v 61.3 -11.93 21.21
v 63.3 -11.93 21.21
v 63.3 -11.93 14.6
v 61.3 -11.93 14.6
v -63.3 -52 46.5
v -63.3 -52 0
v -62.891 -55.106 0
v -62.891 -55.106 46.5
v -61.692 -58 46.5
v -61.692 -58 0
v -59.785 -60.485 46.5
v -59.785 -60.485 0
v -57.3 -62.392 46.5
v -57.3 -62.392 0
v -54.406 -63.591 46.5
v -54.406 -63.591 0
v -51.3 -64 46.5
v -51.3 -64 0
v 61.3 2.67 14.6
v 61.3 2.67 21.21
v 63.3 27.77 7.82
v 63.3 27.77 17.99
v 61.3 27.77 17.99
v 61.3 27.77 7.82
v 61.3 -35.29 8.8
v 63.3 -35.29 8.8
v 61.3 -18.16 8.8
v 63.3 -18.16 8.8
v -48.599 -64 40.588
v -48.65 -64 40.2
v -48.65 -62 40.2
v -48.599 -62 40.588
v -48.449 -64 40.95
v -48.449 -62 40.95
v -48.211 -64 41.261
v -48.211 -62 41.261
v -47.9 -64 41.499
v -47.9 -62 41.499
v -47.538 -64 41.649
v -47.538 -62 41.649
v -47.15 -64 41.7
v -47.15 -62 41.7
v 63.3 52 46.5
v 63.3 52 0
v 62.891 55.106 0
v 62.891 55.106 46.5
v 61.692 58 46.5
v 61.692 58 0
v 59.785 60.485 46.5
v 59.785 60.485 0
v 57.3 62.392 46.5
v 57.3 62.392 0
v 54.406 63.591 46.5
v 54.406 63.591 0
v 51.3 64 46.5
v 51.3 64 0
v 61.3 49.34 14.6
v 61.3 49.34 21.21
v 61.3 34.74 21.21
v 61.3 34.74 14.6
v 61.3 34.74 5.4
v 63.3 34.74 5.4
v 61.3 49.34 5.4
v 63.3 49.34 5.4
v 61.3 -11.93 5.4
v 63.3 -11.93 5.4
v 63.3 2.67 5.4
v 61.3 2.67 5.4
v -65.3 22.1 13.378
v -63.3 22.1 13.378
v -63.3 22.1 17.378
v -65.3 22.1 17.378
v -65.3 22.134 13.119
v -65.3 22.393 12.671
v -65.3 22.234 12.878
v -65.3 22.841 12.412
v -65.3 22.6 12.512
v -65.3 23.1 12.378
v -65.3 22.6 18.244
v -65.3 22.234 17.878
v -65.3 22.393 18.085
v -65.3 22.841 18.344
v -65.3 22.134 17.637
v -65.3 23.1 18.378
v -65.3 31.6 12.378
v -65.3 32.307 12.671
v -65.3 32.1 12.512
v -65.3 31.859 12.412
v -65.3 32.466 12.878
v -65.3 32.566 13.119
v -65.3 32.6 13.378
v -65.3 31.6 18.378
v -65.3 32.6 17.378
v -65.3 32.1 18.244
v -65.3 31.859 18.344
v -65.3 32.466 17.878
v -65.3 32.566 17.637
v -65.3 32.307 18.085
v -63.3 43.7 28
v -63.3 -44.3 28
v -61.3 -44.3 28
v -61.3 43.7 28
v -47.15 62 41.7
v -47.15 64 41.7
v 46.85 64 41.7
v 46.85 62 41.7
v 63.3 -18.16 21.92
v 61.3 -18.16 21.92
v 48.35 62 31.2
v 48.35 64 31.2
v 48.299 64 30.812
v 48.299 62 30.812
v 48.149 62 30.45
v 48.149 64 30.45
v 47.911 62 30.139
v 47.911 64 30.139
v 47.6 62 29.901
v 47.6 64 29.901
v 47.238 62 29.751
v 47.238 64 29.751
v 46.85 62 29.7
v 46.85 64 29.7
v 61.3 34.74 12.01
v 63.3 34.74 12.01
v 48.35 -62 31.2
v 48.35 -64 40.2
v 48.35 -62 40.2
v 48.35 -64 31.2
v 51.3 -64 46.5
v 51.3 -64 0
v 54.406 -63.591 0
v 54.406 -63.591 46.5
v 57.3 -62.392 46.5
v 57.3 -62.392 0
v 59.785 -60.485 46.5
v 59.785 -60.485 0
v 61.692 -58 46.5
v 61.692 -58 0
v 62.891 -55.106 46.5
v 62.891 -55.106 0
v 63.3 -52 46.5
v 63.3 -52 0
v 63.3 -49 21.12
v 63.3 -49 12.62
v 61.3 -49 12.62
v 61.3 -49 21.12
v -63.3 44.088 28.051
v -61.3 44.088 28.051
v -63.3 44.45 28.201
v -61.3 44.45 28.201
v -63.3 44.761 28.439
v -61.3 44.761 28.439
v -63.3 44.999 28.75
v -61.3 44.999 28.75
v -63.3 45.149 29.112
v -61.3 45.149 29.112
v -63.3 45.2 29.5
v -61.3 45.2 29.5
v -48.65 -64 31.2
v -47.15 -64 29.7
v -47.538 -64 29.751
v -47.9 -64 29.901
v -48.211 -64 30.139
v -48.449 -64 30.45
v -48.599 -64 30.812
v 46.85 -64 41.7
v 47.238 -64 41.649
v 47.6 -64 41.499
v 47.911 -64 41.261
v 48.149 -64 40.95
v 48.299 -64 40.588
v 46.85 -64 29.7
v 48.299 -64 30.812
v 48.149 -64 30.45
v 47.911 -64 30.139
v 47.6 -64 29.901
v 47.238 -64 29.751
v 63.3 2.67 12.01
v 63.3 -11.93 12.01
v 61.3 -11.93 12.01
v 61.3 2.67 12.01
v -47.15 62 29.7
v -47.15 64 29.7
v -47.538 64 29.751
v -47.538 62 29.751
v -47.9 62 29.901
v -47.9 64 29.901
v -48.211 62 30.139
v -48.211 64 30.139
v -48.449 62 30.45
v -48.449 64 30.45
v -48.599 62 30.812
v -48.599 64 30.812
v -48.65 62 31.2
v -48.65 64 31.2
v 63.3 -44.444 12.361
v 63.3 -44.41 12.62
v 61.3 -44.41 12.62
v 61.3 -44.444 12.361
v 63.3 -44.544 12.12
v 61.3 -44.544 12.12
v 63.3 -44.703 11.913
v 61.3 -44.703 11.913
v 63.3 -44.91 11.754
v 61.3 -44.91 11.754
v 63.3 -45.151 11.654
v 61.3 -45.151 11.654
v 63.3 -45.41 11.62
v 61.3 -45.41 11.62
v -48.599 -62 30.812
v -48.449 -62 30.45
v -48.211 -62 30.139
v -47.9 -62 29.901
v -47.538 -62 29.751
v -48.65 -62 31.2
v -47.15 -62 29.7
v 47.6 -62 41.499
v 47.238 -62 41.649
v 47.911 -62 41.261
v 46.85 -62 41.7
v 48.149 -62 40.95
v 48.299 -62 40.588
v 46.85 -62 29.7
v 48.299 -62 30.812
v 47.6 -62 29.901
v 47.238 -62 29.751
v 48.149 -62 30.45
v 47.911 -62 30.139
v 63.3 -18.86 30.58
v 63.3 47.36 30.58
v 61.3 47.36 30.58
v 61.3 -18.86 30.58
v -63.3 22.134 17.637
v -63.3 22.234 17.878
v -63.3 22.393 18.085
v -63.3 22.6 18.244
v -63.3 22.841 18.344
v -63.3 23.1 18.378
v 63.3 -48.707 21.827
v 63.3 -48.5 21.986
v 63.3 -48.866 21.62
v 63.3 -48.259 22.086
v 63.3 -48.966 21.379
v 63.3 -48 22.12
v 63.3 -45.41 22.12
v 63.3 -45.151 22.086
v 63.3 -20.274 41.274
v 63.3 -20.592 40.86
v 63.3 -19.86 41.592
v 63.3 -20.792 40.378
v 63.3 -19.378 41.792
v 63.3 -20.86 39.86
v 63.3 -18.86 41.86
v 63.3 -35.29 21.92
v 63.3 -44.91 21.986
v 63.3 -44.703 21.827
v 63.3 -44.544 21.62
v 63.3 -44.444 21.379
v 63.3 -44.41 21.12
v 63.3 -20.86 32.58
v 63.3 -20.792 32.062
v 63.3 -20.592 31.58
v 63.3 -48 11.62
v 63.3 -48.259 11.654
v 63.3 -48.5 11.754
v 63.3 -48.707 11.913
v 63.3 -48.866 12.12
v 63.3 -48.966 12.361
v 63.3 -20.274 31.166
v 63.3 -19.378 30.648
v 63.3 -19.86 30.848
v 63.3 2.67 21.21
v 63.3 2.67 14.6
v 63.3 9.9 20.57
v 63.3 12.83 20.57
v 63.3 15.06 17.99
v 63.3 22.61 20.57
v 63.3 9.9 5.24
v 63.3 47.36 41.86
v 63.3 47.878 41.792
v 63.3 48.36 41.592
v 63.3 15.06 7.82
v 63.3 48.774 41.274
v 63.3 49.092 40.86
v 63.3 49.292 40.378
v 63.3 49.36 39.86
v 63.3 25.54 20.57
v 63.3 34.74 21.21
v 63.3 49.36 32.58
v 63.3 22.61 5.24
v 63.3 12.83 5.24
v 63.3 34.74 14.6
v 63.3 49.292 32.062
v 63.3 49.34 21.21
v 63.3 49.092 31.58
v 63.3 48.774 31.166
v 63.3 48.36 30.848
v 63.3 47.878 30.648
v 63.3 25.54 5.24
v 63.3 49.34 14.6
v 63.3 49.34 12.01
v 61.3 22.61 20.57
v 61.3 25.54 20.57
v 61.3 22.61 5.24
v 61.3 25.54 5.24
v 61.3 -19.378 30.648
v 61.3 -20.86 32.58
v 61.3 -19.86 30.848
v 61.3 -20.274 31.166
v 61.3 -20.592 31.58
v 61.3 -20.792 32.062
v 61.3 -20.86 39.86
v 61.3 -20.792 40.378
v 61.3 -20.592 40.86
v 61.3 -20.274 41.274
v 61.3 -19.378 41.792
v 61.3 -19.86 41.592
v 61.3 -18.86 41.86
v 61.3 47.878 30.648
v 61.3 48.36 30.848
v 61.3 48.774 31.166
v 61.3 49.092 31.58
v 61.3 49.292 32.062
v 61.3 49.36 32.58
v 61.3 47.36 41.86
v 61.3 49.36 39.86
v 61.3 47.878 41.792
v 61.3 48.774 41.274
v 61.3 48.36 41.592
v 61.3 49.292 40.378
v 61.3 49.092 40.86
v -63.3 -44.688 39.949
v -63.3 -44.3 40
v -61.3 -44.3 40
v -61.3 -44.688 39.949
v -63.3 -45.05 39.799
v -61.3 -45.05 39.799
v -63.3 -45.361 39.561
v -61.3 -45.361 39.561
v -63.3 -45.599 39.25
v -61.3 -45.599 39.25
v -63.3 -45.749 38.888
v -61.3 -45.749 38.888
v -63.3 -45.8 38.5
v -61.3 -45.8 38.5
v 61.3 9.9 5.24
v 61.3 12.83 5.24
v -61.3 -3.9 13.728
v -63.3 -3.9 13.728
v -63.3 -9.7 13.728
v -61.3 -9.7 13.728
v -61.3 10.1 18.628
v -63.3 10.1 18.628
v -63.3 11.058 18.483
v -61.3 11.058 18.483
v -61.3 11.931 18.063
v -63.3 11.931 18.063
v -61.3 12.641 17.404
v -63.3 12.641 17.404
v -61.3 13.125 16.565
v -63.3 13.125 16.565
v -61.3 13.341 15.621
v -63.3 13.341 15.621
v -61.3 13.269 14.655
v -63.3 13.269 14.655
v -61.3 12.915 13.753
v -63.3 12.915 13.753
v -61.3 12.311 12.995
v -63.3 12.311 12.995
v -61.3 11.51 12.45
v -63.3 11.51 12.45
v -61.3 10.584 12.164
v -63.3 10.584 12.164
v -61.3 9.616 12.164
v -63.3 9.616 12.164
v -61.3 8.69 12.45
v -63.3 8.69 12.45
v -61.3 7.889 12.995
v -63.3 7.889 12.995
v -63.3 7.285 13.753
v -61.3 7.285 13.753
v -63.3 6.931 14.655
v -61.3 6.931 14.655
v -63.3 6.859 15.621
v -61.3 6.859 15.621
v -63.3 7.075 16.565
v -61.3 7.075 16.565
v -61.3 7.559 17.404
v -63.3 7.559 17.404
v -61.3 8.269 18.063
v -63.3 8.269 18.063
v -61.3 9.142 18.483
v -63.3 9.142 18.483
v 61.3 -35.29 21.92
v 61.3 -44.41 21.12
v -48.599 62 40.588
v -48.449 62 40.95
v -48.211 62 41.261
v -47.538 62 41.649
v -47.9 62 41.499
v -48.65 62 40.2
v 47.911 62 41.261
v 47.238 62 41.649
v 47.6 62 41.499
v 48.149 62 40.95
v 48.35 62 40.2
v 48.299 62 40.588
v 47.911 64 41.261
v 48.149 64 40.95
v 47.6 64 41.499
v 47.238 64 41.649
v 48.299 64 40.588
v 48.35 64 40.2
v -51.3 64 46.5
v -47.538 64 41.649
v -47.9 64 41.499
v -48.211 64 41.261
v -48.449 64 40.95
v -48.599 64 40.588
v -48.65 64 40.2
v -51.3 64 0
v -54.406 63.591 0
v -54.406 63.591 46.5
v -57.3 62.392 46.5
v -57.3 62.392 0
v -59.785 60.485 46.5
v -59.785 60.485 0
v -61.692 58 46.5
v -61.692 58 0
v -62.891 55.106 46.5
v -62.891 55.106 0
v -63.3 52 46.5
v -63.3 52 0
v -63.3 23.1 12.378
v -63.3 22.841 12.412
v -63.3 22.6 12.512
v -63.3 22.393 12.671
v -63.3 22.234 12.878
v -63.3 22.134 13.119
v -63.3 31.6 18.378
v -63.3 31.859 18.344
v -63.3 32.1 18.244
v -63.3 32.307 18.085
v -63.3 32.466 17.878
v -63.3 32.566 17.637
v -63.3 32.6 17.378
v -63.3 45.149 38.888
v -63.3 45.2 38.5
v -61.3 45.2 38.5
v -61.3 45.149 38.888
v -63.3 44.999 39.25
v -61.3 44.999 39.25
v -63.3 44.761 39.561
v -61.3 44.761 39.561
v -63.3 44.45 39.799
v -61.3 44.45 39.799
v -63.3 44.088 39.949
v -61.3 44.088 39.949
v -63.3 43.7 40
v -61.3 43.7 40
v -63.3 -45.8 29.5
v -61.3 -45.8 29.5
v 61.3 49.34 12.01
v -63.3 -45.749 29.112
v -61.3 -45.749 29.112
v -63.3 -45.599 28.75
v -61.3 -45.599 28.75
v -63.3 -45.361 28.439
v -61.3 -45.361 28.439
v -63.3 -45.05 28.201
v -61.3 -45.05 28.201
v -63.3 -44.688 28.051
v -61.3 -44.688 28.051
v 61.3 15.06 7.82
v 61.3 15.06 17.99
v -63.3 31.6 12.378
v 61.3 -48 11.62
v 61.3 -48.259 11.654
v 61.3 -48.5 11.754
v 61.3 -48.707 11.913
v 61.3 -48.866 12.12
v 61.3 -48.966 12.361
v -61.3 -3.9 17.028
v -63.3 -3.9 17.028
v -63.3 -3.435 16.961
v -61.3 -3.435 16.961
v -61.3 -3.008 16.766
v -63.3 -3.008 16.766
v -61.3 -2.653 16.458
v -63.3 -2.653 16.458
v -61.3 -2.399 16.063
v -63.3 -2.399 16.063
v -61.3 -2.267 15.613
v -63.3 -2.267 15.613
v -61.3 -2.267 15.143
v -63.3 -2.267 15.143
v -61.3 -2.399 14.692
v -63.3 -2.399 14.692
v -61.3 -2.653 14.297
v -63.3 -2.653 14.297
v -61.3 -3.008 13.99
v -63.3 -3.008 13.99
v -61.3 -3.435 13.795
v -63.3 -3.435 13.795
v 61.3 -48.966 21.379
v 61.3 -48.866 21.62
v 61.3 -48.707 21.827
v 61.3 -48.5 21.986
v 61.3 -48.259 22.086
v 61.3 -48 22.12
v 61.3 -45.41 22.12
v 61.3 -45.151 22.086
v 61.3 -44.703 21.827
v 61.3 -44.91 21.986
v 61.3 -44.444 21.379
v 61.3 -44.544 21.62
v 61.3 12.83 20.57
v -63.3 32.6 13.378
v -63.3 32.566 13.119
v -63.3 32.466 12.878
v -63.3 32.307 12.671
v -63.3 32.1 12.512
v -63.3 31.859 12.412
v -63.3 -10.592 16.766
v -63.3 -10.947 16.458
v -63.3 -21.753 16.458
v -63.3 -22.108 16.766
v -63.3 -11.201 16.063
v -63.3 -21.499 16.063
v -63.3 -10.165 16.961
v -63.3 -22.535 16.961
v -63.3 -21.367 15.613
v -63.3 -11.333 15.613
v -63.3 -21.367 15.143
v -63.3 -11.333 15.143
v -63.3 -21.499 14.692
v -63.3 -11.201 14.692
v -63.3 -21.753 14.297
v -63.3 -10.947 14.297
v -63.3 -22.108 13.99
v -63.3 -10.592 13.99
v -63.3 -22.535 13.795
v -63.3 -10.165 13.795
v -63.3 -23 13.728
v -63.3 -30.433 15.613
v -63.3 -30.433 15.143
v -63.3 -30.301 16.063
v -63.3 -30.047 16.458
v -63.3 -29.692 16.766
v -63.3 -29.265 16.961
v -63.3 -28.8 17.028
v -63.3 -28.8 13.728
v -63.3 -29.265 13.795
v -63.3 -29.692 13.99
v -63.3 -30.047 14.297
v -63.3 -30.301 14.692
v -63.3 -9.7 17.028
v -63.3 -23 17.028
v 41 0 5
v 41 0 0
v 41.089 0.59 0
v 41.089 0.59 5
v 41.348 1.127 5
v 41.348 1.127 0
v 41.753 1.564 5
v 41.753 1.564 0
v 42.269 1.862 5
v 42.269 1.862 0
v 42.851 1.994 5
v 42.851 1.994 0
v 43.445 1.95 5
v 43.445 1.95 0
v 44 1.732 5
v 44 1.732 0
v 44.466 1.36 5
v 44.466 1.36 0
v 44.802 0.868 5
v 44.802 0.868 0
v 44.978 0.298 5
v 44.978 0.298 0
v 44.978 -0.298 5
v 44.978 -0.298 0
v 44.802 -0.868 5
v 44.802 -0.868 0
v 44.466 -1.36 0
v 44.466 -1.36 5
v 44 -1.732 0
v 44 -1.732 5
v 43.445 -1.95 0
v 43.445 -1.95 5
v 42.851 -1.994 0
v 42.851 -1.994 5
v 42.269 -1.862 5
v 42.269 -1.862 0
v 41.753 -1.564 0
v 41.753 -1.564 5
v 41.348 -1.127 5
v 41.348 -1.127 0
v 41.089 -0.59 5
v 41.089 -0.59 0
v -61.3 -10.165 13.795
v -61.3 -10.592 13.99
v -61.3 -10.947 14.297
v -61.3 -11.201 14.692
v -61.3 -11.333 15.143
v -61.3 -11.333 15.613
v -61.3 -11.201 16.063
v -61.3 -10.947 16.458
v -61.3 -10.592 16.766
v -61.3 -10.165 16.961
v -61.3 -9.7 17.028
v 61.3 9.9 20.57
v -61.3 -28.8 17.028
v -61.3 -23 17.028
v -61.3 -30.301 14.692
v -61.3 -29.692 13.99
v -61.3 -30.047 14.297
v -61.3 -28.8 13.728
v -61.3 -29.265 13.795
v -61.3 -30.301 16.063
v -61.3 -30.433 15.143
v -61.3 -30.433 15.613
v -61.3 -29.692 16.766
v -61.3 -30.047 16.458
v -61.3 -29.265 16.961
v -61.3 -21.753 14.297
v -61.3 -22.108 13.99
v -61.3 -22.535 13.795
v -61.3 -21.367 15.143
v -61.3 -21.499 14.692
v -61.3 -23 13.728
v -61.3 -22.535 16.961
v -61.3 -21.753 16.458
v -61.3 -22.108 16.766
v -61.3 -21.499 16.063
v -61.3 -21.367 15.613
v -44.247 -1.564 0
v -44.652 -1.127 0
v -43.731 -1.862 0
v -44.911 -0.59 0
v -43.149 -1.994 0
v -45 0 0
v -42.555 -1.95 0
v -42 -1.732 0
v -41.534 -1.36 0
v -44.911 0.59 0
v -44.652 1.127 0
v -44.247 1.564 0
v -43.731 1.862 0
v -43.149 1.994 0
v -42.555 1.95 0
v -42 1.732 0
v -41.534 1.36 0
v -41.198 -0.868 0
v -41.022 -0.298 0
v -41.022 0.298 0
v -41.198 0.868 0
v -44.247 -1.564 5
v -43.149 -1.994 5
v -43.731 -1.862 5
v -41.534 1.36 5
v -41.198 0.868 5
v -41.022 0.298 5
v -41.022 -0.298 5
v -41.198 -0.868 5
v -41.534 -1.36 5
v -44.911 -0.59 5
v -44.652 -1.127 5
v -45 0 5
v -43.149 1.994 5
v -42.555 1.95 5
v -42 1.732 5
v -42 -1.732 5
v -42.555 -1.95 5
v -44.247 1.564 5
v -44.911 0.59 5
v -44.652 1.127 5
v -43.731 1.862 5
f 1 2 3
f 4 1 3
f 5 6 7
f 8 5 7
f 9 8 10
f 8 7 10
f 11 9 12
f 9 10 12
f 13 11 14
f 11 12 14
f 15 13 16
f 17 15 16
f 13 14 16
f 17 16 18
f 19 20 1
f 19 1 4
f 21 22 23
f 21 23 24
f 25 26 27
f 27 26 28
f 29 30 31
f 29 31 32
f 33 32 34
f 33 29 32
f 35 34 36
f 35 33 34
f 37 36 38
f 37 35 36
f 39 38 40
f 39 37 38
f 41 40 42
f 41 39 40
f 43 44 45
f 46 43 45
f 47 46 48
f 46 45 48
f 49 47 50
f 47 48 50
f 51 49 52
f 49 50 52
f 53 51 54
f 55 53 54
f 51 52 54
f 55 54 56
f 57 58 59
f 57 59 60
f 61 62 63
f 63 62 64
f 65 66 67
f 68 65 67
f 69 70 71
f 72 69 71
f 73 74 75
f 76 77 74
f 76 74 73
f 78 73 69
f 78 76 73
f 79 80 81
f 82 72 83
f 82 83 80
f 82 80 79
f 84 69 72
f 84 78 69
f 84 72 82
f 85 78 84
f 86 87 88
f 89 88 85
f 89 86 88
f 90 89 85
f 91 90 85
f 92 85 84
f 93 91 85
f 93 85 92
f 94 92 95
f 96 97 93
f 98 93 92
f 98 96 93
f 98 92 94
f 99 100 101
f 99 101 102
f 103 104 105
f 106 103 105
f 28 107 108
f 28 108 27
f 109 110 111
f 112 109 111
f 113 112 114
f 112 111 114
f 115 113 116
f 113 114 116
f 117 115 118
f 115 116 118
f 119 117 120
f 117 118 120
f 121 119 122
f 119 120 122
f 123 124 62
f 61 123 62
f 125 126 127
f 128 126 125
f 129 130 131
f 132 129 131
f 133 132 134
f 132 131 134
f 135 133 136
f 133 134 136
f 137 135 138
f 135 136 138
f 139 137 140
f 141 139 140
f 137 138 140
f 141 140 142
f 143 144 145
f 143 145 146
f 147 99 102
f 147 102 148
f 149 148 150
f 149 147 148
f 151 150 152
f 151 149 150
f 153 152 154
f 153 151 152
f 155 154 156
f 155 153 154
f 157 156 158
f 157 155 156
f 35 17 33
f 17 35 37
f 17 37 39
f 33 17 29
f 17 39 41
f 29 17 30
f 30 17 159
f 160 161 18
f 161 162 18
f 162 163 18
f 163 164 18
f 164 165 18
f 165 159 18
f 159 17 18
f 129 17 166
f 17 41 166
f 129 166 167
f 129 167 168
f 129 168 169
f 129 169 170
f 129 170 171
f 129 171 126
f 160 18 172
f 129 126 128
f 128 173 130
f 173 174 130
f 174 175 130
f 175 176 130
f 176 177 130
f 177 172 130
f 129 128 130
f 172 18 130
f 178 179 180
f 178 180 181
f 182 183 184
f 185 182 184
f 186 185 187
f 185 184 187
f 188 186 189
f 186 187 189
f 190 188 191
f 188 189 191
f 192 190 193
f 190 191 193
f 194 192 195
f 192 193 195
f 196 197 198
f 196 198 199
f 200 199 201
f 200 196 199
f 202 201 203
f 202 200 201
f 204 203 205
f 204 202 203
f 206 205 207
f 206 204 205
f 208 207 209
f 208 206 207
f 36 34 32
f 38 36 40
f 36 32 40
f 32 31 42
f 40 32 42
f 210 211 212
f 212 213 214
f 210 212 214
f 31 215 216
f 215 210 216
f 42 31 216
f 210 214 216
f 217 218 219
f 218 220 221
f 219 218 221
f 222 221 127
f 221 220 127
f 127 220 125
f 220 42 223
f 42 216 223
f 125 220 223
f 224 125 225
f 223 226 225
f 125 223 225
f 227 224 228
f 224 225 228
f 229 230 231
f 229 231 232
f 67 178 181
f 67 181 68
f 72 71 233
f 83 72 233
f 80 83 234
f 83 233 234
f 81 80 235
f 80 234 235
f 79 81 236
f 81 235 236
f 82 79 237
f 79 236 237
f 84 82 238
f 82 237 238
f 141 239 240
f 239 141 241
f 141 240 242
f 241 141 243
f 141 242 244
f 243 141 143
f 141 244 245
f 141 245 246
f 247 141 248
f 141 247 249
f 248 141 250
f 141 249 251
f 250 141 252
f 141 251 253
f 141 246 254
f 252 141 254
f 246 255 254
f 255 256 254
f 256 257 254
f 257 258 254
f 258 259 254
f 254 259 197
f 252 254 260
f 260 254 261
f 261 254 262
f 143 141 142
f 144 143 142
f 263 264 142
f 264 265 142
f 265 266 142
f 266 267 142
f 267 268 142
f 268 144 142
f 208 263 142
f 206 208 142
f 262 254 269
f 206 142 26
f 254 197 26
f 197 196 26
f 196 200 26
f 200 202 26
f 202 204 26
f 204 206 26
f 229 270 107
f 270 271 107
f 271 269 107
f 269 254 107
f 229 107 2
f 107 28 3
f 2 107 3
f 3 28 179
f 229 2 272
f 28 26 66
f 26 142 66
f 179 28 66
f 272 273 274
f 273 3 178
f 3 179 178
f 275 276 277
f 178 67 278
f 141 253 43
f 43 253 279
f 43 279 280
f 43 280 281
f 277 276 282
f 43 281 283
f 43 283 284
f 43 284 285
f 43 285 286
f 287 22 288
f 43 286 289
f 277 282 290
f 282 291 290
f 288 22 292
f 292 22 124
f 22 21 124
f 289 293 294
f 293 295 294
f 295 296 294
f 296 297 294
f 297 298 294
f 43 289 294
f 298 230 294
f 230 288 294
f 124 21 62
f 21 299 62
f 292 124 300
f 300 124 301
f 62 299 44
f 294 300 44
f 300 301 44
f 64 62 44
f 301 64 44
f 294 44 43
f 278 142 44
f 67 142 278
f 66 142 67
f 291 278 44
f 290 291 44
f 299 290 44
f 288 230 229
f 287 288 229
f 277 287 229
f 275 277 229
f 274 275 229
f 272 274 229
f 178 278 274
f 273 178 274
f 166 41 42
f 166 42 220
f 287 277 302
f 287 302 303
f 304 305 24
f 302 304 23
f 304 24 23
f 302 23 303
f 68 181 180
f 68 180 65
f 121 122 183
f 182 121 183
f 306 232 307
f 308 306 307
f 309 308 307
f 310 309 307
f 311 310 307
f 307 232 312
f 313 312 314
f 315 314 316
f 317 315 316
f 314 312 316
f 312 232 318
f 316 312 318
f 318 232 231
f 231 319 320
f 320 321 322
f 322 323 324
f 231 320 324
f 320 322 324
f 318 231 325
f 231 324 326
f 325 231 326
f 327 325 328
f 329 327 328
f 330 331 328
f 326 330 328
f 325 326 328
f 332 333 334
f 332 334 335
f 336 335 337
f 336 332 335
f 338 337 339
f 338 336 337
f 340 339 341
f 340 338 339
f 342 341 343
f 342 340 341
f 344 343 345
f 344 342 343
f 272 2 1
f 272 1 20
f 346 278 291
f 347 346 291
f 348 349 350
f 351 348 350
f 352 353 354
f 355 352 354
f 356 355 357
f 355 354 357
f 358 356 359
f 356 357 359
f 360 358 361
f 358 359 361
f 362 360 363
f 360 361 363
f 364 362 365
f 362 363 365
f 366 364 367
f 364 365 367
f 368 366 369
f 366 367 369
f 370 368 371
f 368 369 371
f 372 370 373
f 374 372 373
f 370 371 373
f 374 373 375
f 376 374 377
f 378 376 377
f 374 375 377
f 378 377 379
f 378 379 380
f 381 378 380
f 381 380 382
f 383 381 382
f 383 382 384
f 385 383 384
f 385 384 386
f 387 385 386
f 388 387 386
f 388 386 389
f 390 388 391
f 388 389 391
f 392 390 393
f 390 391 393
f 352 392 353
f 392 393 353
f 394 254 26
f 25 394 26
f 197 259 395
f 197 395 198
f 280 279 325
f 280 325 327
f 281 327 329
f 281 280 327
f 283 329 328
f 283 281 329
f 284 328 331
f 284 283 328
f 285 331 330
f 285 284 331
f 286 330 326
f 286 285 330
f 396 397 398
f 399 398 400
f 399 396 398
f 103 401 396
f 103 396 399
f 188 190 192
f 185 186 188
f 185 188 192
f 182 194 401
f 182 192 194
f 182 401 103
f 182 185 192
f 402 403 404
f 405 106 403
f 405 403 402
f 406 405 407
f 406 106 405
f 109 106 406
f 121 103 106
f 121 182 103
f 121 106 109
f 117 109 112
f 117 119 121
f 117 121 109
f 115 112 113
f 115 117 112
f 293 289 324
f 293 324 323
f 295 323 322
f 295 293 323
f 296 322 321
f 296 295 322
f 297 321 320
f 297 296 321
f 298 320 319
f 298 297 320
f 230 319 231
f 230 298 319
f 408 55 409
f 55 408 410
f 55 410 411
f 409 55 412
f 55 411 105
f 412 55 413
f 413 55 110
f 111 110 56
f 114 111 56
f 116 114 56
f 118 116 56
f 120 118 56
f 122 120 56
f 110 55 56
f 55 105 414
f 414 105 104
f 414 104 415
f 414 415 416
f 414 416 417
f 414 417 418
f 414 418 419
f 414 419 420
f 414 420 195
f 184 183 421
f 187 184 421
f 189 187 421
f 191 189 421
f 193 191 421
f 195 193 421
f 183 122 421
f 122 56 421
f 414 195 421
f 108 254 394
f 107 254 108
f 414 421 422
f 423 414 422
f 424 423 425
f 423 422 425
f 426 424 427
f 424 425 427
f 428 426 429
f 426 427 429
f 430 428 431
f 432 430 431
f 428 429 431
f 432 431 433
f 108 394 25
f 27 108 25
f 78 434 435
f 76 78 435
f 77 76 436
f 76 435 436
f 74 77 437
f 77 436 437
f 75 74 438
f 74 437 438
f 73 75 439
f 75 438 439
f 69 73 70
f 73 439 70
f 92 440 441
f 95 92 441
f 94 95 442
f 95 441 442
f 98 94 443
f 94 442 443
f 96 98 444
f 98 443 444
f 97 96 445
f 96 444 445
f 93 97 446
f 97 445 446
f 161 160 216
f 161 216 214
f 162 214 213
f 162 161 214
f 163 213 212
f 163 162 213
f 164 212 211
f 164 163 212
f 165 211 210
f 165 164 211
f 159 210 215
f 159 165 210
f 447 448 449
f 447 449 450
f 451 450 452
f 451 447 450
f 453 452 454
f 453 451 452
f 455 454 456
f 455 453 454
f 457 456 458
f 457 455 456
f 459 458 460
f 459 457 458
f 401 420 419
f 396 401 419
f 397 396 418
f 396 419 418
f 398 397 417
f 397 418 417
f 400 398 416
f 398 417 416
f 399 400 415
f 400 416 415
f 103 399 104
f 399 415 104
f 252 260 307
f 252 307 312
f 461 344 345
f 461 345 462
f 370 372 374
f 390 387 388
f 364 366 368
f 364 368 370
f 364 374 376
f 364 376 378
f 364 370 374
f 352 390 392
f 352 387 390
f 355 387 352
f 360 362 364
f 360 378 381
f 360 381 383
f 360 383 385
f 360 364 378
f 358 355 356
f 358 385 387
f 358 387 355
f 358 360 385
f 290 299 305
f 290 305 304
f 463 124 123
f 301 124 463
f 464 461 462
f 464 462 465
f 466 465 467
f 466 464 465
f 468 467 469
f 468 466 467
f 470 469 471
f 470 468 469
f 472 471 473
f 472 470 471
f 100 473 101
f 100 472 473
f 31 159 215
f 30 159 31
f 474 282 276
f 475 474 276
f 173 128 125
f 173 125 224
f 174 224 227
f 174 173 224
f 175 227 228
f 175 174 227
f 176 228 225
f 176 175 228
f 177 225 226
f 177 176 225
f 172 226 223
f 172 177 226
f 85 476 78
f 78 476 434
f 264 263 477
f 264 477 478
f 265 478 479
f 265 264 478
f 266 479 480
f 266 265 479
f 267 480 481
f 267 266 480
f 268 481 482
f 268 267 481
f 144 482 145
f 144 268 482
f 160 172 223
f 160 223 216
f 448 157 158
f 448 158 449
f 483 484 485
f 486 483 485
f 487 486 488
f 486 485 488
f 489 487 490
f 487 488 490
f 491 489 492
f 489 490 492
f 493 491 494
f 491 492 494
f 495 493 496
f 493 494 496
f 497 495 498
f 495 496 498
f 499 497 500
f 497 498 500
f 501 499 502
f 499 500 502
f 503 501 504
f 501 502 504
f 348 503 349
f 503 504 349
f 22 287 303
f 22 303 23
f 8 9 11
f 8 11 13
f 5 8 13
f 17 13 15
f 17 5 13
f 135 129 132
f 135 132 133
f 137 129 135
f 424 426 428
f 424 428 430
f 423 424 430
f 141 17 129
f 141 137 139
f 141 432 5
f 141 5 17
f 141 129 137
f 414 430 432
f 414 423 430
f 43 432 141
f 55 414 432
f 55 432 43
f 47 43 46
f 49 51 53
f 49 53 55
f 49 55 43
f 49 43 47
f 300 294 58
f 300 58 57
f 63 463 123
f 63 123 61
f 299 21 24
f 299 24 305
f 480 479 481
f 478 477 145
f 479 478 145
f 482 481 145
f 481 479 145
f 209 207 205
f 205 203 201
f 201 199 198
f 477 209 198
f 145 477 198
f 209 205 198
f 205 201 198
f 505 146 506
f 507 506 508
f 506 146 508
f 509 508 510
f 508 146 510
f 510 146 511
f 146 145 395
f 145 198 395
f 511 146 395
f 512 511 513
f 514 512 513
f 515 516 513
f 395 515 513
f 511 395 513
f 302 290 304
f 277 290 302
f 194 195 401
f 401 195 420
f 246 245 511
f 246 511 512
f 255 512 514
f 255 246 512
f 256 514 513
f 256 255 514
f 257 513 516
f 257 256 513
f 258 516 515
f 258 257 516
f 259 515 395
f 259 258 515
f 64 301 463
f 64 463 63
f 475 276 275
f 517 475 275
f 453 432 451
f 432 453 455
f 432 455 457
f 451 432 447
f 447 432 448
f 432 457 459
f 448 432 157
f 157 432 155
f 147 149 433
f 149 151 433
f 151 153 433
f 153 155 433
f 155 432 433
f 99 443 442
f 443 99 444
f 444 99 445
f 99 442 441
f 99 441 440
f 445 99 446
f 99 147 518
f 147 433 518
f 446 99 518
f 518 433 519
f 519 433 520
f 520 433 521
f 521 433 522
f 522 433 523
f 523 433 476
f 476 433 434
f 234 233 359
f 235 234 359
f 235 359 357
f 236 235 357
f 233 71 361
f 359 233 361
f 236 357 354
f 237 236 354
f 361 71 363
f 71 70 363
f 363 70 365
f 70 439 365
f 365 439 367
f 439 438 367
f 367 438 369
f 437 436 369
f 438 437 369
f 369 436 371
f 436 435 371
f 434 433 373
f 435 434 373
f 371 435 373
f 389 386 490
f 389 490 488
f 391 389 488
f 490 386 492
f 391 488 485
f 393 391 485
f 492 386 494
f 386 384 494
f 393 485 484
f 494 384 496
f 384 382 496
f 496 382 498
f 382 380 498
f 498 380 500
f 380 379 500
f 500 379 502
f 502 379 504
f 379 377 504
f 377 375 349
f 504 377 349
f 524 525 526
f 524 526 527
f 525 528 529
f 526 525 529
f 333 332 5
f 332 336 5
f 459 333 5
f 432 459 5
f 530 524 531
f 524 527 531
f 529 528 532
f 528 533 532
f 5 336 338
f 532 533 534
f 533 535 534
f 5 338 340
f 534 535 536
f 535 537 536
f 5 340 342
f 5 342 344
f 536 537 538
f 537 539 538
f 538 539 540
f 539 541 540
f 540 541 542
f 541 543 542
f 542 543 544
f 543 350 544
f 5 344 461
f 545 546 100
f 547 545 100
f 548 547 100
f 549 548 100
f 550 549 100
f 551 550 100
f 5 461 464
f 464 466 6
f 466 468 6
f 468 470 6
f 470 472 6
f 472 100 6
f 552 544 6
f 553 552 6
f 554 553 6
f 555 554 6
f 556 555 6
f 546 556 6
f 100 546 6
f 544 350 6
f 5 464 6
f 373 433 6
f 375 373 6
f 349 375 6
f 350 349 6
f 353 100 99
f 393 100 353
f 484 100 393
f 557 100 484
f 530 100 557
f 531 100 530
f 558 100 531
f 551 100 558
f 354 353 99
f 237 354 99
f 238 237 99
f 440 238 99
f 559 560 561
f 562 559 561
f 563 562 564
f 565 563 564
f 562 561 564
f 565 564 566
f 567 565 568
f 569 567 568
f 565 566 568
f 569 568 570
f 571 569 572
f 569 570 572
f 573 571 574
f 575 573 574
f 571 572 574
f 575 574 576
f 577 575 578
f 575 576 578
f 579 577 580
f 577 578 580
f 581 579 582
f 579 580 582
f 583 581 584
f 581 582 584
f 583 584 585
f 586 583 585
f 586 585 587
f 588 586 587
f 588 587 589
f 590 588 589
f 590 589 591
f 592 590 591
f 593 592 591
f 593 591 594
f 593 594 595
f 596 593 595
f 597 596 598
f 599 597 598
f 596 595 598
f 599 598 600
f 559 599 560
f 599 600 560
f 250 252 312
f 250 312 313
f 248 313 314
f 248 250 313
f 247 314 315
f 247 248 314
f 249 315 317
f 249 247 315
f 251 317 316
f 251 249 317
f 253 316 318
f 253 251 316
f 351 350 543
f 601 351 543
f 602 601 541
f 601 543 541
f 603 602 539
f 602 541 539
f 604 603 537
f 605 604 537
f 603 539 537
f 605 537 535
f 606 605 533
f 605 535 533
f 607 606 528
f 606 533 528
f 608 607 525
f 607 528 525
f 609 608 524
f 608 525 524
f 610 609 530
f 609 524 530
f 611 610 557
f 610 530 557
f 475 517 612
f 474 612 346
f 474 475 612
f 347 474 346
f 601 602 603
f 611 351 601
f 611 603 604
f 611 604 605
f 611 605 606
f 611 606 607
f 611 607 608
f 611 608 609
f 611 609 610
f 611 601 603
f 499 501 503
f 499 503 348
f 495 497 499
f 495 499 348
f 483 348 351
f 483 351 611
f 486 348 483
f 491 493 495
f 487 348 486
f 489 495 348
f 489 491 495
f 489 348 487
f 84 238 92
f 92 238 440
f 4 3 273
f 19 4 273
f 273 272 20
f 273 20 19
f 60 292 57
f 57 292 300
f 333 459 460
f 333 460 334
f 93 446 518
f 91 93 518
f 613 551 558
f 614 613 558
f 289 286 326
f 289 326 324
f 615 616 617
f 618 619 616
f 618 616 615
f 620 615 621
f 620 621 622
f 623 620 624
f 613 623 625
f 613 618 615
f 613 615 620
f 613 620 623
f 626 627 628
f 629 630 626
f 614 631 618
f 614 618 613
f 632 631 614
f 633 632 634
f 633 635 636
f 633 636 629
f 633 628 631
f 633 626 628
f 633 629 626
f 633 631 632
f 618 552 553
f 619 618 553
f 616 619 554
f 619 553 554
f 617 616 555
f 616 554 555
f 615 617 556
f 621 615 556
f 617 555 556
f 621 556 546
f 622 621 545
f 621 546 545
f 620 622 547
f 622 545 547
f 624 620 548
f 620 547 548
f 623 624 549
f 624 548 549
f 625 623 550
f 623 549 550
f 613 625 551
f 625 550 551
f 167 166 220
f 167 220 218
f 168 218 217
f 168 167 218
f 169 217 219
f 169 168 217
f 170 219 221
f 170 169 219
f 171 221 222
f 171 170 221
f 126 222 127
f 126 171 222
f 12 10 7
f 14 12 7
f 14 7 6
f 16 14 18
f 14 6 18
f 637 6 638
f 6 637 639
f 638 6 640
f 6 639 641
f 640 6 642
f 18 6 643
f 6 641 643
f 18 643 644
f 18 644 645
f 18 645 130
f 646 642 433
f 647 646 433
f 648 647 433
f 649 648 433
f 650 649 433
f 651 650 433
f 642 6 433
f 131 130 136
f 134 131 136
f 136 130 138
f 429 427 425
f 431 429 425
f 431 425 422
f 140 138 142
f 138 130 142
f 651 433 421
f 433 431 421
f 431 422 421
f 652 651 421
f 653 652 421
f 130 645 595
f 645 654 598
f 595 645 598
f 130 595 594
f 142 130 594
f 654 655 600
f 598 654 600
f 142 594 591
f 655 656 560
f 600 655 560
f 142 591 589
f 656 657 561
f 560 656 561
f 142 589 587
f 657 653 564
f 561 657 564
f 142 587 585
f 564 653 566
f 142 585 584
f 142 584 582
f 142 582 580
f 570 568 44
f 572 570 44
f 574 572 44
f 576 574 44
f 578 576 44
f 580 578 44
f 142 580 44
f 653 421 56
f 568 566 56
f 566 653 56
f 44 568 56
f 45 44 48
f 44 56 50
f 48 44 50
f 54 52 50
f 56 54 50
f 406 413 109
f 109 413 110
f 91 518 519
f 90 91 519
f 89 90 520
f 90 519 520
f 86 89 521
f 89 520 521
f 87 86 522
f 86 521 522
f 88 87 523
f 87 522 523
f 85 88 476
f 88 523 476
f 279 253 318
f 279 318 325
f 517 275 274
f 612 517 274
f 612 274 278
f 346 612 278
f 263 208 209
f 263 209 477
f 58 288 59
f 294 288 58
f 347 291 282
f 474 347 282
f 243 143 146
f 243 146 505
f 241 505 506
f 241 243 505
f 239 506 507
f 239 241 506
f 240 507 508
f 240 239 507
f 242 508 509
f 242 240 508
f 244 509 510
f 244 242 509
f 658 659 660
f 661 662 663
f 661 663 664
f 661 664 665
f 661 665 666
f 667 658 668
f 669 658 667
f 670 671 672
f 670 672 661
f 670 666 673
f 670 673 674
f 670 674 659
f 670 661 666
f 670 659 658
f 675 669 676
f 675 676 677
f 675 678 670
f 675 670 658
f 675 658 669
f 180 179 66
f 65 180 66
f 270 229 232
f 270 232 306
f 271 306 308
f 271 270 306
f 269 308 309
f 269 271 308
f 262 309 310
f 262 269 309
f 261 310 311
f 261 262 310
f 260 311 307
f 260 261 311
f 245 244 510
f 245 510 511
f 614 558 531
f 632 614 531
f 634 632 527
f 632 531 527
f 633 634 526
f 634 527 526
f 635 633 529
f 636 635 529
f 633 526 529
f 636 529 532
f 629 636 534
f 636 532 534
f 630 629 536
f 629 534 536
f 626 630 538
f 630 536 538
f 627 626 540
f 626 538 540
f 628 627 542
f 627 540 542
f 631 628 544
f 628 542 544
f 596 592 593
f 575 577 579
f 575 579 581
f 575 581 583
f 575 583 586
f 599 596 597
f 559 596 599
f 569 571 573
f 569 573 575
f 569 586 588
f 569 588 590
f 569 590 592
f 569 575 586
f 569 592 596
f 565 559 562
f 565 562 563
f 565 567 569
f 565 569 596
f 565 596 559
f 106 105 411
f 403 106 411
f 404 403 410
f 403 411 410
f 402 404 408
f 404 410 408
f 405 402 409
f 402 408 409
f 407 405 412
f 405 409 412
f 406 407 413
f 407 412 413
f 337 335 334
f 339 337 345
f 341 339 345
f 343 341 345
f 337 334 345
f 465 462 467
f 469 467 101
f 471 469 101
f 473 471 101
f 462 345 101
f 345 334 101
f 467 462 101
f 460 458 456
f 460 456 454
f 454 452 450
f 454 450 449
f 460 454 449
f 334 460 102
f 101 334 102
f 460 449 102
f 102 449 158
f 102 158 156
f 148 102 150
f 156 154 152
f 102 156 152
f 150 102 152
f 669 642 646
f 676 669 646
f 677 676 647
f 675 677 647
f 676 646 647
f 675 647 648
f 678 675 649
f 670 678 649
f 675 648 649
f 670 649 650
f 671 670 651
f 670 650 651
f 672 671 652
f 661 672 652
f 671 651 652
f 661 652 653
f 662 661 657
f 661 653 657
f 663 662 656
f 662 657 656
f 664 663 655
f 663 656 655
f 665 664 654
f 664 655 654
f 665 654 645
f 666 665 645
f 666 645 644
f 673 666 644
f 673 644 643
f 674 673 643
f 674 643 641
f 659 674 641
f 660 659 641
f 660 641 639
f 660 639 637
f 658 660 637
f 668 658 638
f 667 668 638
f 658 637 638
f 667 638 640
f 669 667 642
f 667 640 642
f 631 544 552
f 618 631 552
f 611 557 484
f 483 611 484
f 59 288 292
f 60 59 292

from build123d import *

# Parameters (mm, degrees)
DODANIE_WYCI_GNI_CIE1_DEPTH = 46.5
WYTNIJ_WYCI_GNI_CIE1_DEPTH  = 2
SZKIC3_R                    = 3.25
WYTNIJ_WYCI_GNI_CIE2_DEPTH  = 2
DODANIE_WYCI_GNI_CIE2_DEPTH = 2
SZKIC5_W                    = 6.61
SZKIC5_H                    = 14.6
SZKIC5_W_2                  = 13.12
SZKIC5_H_2                  = 17.13
WYTNIJ_WYCI_GNI_CIE3_DEPTH  = 2
SKETCH1_R                   = 2
CUT_EXTRUDE1_DEPTH          = 5


with BuildPart() as part:
    # Szkic1 → Dodanie-wyciągnięcie1 (new body)
    with BuildSketch(Plane.XY):
        with BuildLine():
            Line((-51.3, -64), (51.3, -64))
            ThreePointArc((51.3, -64), (59.785281374, -60.485281374), (63.3, -52))
            Line((63.3, -52), (63.3, 52))
            ThreePointArc((63.3, 52), (59.785281374, 60.485281374), (51.3, 64))
            Line((51.3, 64), (-51.3, 64))
            ThreePointArc((-51.3, 64), (-59.785281374, 60.485281374), (-63.3, 52))
            Line((-63.3, 52), (-63.3, -52))
            ThreePointArc((-63.3, -52), (-59.785281374, -60.485281374), (-51.3, -64))
        make_face()
    extrude(amount=DODANIE_WYCI_GNI_CIE1_DEPTH)

    # Szkic2 → Wytnij-wyciągnięcie1 (cut)
    with BuildSketch(Plane(origin=(0, 64, 0), x_dir=(1, 0, 0), z_dir=(0, 1, 0))):
        with BuildLine():
            Line((-48.65, -31.2), (-48.65, -40.2))
            ThreePointArc((-48.65, -40.2), (-48.210660172, -41.260660172), (-47.15, -41.7))
            Line((-47.15, -41.7), (46.85, -41.7))
            ThreePointArc((46.85, -41.7), (47.910660172, -41.260660172), (48.35, -40.2))
            Line((48.35, -40.2), (48.35, -31.2))
            ThreePointArc((48.35, -31.2), (47.910660172, -30.139339828), (46.85, -29.7))
            Line((46.85, -29.7), (-47.15, -29.7))
            ThreePointArc((-47.15, -29.7), (-48.210660172, -30.139339828), (-48.65, -31.2))
        make_face()
    wytnij_wyci_gni_cie1 = extrude(amount=-WYTNIJ_WYCI_GNI_CIE1_DEPTH, mode=Mode.SUBTRACT)

    # Szkic3 → Wytnij-wyciągnięcie2 (cut)
    with BuildSketch(Plane.ZY.offset(63.3)):
        with BuildLine():
            ThreePointArc((28, -44.3), (28.439339828, -45.360660172), (29.5, -45.8))
            Line((29.5, -45.8), (38.5, -45.8))
            ThreePointArc((38.5, -45.8), (39.560660172, -45.360660172), (40, -44.3))
            Line((40, -44.3), (40, 43.7))
            ThreePointArc((40, 43.7), (39.560660172, 44.760660172), (38.5, 45.2))
            Line((38.5, 45.2), (29.5, 45.2))
            ThreePointArc((29.5, 45.2), (28.439339828, 44.760660172), (28, 43.7))
            Line((28, 43.7), (28, -44.3))
        make_face()
        with BuildLine():
            Line((17.02769909, -28.8), (17.02769909, -23))
            ThreePointArc((17.02769909, -23), (15.37769909, -21.35), (13.72769909, -23))
            Line((13.72769909, -23), (13.72769909, -28.8))
            ThreePointArc((13.72769909, -28.8), (15.37769909, -30.45), (17.02769909, -28.8))
        make_face()
        with BuildLine():
            Line((17.02769909, -9.7), (17.02769909, -3.9))
            ThreePointArc((17.02769909, -3.9), (15.37769909, -2.25), (13.72769909, -3.9))
            Line((13.72769909, -3.9), (13.72769909, -9.7))
            ThreePointArc((13.72769909, -9.7), (15.37769909, -11.35), (17.02769909, -9.7))
        make_face()
        with Locations((15.37769909, 10.1)):
            Circle(SZKIC3_R)
    extrude(amount=-WYTNIJ_WYCI_GNI_CIE2_DEPTH, mode=Mode.SUBTRACT)

    # Szkic3<3> → Dodanie-wyciągnięcie2 (add)
    with BuildSketch(Plane.ZY.offset(63.3)):
        with BuildLine():
            Line((17.37769909, 32.6), (13.37769909, 32.6))
            ThreePointArc((13.37769909, 32.6), (12.670592309, 32.307106781), (12.37769909, 31.6))
            Line((12.37769909, 31.6), (12.37769909, 23.1))
            ThreePointArc((12.37769909, 23.1), (12.670592309, 22.392893219), (13.37769909, 22.1))
            Line((13.37769909, 22.1), (17.37769909, 22.1))
            ThreePointArc((17.37769909, 22.1), (18.084805871, 22.392893219), (18.37769909, 23.1))
            Line((18.37769909, 23.1), (18.37769909, 31.6))
            ThreePointArc((18.37769909, 31.6), (18.084805871, 32.307106781), (17.37769909, 32.6))
        make_face()
    extrude(amount=DODANIE_WYCI_GNI_CIE2_DEPTH)

    # Lustro1: Wytnij-wyciągnięcie1 across plane
    add(wytnij_wyci_gni_cie1.mirror(Plane.ZX), mode=Mode.SUBTRACT)

    # Szkic5 → Wytnij-wyciągnięcie3 (cut)
    with BuildSketch(Plane(origin=(63.3, 0, 0), x_dir=(0, 0, -1), z_dir=(1, 0, 0))):
        with BuildLine():
            Line((-39.86, 49.36), (-32.58, 49.36))
            ThreePointArc((-32.58, 49.36), (-31.165786438, 48.774213562), (-30.58, 47.36))
            Line((-30.58, 47.36), (-30.58, -18.86))
            ThreePointArc((-30.58, -18.86), (-31.165786438, -20.274213562), (-32.58, -20.86))
            Line((-32.58, -20.86), (-39.86, -20.86))
            ThreePointArc((-39.86, -20.86), (-41.274213562, -20.274213562), (-41.86, -18.86))
            Line((-41.86, -18.86), (-41.86, 47.36))
            ThreePointArc((-41.86, 47.36), (-41.274213562, 48.774213562), (-39.86, 49.36))
        make_face()
        with BuildLine():
            Line((-21.12, -44.41), (-12.62, -44.41))
            ThreePointArc((-12.62, -44.41), (-11.912893219, -44.702893219), (-11.62, -45.41))
            Line((-11.62, -45.41), (-11.62, -48))
            ThreePointArc((-11.62, -48), (-11.912893219, -48.707106781), (-12.62, -49))
            Line((-12.62, -49), (-21.12, -49))
            ThreePointArc((-21.12, -49), (-21.827106781, -48.707106781), (-22.12, -48))
            Line((-22.12, -48), (-22.12, -45.41))
            ThreePointArc((-22.12, -45.41), (-21.827106781, -44.702893219), (-21.12, -44.41))
        make_face()
        with Locations((-8.705, -4.63)):
            Rectangle(SZKIC5_W, SZKIC5_H)
        with Locations((-15.36, -26.725)):
            Rectangle(SZKIC5_W_2, SZKIC5_H_2)
        with Locations((-17.905, -4.63)):
            Rectangle(SZKIC5_W, SZKIC5_H)
        Polygon((-20.57, 9.9), (-5.24, 9.9), (-5.24, 12.83), (-7.82, 15.06), (-17.99, 15.06), (-20.57, 12.83), align=None)
        Polygon((-7.82, 27.77), (-5.24, 25.54), (-5.24, 22.61), (-20.57, 22.61), (-20.57, 25.54), (-17.99, 27.77), align=None)
        with Locations((-17.905, 42.04)):
            Rectangle(SZKIC5_W, SZKIC5_H)
        with Locations((-8.705, 42.04)):
            Rectangle(SZKIC5_W, SZKIC5_H)
    extrude(amount=-WYTNIJ_WYCI_GNI_CIE3_DEPTH, mode=Mode.SUBTRACT)

    # Sketch1 → Cut-Extrude1 (cut)
    with BuildSketch(Plane(origin=(0, 0, 0), x_dir=(-1, 0, 0), z_dir=(0, 0, -1))):
        with Locations((-43, 0)):
            Circle(SKETCH1_R)
        with Locations((43, 0)):
            Circle(SKETCH1_R)
    extrude(amount=-CUT_EXTRUDE1_DEPTH, mode=Mode.SUBTRACT)


solid = part.part
